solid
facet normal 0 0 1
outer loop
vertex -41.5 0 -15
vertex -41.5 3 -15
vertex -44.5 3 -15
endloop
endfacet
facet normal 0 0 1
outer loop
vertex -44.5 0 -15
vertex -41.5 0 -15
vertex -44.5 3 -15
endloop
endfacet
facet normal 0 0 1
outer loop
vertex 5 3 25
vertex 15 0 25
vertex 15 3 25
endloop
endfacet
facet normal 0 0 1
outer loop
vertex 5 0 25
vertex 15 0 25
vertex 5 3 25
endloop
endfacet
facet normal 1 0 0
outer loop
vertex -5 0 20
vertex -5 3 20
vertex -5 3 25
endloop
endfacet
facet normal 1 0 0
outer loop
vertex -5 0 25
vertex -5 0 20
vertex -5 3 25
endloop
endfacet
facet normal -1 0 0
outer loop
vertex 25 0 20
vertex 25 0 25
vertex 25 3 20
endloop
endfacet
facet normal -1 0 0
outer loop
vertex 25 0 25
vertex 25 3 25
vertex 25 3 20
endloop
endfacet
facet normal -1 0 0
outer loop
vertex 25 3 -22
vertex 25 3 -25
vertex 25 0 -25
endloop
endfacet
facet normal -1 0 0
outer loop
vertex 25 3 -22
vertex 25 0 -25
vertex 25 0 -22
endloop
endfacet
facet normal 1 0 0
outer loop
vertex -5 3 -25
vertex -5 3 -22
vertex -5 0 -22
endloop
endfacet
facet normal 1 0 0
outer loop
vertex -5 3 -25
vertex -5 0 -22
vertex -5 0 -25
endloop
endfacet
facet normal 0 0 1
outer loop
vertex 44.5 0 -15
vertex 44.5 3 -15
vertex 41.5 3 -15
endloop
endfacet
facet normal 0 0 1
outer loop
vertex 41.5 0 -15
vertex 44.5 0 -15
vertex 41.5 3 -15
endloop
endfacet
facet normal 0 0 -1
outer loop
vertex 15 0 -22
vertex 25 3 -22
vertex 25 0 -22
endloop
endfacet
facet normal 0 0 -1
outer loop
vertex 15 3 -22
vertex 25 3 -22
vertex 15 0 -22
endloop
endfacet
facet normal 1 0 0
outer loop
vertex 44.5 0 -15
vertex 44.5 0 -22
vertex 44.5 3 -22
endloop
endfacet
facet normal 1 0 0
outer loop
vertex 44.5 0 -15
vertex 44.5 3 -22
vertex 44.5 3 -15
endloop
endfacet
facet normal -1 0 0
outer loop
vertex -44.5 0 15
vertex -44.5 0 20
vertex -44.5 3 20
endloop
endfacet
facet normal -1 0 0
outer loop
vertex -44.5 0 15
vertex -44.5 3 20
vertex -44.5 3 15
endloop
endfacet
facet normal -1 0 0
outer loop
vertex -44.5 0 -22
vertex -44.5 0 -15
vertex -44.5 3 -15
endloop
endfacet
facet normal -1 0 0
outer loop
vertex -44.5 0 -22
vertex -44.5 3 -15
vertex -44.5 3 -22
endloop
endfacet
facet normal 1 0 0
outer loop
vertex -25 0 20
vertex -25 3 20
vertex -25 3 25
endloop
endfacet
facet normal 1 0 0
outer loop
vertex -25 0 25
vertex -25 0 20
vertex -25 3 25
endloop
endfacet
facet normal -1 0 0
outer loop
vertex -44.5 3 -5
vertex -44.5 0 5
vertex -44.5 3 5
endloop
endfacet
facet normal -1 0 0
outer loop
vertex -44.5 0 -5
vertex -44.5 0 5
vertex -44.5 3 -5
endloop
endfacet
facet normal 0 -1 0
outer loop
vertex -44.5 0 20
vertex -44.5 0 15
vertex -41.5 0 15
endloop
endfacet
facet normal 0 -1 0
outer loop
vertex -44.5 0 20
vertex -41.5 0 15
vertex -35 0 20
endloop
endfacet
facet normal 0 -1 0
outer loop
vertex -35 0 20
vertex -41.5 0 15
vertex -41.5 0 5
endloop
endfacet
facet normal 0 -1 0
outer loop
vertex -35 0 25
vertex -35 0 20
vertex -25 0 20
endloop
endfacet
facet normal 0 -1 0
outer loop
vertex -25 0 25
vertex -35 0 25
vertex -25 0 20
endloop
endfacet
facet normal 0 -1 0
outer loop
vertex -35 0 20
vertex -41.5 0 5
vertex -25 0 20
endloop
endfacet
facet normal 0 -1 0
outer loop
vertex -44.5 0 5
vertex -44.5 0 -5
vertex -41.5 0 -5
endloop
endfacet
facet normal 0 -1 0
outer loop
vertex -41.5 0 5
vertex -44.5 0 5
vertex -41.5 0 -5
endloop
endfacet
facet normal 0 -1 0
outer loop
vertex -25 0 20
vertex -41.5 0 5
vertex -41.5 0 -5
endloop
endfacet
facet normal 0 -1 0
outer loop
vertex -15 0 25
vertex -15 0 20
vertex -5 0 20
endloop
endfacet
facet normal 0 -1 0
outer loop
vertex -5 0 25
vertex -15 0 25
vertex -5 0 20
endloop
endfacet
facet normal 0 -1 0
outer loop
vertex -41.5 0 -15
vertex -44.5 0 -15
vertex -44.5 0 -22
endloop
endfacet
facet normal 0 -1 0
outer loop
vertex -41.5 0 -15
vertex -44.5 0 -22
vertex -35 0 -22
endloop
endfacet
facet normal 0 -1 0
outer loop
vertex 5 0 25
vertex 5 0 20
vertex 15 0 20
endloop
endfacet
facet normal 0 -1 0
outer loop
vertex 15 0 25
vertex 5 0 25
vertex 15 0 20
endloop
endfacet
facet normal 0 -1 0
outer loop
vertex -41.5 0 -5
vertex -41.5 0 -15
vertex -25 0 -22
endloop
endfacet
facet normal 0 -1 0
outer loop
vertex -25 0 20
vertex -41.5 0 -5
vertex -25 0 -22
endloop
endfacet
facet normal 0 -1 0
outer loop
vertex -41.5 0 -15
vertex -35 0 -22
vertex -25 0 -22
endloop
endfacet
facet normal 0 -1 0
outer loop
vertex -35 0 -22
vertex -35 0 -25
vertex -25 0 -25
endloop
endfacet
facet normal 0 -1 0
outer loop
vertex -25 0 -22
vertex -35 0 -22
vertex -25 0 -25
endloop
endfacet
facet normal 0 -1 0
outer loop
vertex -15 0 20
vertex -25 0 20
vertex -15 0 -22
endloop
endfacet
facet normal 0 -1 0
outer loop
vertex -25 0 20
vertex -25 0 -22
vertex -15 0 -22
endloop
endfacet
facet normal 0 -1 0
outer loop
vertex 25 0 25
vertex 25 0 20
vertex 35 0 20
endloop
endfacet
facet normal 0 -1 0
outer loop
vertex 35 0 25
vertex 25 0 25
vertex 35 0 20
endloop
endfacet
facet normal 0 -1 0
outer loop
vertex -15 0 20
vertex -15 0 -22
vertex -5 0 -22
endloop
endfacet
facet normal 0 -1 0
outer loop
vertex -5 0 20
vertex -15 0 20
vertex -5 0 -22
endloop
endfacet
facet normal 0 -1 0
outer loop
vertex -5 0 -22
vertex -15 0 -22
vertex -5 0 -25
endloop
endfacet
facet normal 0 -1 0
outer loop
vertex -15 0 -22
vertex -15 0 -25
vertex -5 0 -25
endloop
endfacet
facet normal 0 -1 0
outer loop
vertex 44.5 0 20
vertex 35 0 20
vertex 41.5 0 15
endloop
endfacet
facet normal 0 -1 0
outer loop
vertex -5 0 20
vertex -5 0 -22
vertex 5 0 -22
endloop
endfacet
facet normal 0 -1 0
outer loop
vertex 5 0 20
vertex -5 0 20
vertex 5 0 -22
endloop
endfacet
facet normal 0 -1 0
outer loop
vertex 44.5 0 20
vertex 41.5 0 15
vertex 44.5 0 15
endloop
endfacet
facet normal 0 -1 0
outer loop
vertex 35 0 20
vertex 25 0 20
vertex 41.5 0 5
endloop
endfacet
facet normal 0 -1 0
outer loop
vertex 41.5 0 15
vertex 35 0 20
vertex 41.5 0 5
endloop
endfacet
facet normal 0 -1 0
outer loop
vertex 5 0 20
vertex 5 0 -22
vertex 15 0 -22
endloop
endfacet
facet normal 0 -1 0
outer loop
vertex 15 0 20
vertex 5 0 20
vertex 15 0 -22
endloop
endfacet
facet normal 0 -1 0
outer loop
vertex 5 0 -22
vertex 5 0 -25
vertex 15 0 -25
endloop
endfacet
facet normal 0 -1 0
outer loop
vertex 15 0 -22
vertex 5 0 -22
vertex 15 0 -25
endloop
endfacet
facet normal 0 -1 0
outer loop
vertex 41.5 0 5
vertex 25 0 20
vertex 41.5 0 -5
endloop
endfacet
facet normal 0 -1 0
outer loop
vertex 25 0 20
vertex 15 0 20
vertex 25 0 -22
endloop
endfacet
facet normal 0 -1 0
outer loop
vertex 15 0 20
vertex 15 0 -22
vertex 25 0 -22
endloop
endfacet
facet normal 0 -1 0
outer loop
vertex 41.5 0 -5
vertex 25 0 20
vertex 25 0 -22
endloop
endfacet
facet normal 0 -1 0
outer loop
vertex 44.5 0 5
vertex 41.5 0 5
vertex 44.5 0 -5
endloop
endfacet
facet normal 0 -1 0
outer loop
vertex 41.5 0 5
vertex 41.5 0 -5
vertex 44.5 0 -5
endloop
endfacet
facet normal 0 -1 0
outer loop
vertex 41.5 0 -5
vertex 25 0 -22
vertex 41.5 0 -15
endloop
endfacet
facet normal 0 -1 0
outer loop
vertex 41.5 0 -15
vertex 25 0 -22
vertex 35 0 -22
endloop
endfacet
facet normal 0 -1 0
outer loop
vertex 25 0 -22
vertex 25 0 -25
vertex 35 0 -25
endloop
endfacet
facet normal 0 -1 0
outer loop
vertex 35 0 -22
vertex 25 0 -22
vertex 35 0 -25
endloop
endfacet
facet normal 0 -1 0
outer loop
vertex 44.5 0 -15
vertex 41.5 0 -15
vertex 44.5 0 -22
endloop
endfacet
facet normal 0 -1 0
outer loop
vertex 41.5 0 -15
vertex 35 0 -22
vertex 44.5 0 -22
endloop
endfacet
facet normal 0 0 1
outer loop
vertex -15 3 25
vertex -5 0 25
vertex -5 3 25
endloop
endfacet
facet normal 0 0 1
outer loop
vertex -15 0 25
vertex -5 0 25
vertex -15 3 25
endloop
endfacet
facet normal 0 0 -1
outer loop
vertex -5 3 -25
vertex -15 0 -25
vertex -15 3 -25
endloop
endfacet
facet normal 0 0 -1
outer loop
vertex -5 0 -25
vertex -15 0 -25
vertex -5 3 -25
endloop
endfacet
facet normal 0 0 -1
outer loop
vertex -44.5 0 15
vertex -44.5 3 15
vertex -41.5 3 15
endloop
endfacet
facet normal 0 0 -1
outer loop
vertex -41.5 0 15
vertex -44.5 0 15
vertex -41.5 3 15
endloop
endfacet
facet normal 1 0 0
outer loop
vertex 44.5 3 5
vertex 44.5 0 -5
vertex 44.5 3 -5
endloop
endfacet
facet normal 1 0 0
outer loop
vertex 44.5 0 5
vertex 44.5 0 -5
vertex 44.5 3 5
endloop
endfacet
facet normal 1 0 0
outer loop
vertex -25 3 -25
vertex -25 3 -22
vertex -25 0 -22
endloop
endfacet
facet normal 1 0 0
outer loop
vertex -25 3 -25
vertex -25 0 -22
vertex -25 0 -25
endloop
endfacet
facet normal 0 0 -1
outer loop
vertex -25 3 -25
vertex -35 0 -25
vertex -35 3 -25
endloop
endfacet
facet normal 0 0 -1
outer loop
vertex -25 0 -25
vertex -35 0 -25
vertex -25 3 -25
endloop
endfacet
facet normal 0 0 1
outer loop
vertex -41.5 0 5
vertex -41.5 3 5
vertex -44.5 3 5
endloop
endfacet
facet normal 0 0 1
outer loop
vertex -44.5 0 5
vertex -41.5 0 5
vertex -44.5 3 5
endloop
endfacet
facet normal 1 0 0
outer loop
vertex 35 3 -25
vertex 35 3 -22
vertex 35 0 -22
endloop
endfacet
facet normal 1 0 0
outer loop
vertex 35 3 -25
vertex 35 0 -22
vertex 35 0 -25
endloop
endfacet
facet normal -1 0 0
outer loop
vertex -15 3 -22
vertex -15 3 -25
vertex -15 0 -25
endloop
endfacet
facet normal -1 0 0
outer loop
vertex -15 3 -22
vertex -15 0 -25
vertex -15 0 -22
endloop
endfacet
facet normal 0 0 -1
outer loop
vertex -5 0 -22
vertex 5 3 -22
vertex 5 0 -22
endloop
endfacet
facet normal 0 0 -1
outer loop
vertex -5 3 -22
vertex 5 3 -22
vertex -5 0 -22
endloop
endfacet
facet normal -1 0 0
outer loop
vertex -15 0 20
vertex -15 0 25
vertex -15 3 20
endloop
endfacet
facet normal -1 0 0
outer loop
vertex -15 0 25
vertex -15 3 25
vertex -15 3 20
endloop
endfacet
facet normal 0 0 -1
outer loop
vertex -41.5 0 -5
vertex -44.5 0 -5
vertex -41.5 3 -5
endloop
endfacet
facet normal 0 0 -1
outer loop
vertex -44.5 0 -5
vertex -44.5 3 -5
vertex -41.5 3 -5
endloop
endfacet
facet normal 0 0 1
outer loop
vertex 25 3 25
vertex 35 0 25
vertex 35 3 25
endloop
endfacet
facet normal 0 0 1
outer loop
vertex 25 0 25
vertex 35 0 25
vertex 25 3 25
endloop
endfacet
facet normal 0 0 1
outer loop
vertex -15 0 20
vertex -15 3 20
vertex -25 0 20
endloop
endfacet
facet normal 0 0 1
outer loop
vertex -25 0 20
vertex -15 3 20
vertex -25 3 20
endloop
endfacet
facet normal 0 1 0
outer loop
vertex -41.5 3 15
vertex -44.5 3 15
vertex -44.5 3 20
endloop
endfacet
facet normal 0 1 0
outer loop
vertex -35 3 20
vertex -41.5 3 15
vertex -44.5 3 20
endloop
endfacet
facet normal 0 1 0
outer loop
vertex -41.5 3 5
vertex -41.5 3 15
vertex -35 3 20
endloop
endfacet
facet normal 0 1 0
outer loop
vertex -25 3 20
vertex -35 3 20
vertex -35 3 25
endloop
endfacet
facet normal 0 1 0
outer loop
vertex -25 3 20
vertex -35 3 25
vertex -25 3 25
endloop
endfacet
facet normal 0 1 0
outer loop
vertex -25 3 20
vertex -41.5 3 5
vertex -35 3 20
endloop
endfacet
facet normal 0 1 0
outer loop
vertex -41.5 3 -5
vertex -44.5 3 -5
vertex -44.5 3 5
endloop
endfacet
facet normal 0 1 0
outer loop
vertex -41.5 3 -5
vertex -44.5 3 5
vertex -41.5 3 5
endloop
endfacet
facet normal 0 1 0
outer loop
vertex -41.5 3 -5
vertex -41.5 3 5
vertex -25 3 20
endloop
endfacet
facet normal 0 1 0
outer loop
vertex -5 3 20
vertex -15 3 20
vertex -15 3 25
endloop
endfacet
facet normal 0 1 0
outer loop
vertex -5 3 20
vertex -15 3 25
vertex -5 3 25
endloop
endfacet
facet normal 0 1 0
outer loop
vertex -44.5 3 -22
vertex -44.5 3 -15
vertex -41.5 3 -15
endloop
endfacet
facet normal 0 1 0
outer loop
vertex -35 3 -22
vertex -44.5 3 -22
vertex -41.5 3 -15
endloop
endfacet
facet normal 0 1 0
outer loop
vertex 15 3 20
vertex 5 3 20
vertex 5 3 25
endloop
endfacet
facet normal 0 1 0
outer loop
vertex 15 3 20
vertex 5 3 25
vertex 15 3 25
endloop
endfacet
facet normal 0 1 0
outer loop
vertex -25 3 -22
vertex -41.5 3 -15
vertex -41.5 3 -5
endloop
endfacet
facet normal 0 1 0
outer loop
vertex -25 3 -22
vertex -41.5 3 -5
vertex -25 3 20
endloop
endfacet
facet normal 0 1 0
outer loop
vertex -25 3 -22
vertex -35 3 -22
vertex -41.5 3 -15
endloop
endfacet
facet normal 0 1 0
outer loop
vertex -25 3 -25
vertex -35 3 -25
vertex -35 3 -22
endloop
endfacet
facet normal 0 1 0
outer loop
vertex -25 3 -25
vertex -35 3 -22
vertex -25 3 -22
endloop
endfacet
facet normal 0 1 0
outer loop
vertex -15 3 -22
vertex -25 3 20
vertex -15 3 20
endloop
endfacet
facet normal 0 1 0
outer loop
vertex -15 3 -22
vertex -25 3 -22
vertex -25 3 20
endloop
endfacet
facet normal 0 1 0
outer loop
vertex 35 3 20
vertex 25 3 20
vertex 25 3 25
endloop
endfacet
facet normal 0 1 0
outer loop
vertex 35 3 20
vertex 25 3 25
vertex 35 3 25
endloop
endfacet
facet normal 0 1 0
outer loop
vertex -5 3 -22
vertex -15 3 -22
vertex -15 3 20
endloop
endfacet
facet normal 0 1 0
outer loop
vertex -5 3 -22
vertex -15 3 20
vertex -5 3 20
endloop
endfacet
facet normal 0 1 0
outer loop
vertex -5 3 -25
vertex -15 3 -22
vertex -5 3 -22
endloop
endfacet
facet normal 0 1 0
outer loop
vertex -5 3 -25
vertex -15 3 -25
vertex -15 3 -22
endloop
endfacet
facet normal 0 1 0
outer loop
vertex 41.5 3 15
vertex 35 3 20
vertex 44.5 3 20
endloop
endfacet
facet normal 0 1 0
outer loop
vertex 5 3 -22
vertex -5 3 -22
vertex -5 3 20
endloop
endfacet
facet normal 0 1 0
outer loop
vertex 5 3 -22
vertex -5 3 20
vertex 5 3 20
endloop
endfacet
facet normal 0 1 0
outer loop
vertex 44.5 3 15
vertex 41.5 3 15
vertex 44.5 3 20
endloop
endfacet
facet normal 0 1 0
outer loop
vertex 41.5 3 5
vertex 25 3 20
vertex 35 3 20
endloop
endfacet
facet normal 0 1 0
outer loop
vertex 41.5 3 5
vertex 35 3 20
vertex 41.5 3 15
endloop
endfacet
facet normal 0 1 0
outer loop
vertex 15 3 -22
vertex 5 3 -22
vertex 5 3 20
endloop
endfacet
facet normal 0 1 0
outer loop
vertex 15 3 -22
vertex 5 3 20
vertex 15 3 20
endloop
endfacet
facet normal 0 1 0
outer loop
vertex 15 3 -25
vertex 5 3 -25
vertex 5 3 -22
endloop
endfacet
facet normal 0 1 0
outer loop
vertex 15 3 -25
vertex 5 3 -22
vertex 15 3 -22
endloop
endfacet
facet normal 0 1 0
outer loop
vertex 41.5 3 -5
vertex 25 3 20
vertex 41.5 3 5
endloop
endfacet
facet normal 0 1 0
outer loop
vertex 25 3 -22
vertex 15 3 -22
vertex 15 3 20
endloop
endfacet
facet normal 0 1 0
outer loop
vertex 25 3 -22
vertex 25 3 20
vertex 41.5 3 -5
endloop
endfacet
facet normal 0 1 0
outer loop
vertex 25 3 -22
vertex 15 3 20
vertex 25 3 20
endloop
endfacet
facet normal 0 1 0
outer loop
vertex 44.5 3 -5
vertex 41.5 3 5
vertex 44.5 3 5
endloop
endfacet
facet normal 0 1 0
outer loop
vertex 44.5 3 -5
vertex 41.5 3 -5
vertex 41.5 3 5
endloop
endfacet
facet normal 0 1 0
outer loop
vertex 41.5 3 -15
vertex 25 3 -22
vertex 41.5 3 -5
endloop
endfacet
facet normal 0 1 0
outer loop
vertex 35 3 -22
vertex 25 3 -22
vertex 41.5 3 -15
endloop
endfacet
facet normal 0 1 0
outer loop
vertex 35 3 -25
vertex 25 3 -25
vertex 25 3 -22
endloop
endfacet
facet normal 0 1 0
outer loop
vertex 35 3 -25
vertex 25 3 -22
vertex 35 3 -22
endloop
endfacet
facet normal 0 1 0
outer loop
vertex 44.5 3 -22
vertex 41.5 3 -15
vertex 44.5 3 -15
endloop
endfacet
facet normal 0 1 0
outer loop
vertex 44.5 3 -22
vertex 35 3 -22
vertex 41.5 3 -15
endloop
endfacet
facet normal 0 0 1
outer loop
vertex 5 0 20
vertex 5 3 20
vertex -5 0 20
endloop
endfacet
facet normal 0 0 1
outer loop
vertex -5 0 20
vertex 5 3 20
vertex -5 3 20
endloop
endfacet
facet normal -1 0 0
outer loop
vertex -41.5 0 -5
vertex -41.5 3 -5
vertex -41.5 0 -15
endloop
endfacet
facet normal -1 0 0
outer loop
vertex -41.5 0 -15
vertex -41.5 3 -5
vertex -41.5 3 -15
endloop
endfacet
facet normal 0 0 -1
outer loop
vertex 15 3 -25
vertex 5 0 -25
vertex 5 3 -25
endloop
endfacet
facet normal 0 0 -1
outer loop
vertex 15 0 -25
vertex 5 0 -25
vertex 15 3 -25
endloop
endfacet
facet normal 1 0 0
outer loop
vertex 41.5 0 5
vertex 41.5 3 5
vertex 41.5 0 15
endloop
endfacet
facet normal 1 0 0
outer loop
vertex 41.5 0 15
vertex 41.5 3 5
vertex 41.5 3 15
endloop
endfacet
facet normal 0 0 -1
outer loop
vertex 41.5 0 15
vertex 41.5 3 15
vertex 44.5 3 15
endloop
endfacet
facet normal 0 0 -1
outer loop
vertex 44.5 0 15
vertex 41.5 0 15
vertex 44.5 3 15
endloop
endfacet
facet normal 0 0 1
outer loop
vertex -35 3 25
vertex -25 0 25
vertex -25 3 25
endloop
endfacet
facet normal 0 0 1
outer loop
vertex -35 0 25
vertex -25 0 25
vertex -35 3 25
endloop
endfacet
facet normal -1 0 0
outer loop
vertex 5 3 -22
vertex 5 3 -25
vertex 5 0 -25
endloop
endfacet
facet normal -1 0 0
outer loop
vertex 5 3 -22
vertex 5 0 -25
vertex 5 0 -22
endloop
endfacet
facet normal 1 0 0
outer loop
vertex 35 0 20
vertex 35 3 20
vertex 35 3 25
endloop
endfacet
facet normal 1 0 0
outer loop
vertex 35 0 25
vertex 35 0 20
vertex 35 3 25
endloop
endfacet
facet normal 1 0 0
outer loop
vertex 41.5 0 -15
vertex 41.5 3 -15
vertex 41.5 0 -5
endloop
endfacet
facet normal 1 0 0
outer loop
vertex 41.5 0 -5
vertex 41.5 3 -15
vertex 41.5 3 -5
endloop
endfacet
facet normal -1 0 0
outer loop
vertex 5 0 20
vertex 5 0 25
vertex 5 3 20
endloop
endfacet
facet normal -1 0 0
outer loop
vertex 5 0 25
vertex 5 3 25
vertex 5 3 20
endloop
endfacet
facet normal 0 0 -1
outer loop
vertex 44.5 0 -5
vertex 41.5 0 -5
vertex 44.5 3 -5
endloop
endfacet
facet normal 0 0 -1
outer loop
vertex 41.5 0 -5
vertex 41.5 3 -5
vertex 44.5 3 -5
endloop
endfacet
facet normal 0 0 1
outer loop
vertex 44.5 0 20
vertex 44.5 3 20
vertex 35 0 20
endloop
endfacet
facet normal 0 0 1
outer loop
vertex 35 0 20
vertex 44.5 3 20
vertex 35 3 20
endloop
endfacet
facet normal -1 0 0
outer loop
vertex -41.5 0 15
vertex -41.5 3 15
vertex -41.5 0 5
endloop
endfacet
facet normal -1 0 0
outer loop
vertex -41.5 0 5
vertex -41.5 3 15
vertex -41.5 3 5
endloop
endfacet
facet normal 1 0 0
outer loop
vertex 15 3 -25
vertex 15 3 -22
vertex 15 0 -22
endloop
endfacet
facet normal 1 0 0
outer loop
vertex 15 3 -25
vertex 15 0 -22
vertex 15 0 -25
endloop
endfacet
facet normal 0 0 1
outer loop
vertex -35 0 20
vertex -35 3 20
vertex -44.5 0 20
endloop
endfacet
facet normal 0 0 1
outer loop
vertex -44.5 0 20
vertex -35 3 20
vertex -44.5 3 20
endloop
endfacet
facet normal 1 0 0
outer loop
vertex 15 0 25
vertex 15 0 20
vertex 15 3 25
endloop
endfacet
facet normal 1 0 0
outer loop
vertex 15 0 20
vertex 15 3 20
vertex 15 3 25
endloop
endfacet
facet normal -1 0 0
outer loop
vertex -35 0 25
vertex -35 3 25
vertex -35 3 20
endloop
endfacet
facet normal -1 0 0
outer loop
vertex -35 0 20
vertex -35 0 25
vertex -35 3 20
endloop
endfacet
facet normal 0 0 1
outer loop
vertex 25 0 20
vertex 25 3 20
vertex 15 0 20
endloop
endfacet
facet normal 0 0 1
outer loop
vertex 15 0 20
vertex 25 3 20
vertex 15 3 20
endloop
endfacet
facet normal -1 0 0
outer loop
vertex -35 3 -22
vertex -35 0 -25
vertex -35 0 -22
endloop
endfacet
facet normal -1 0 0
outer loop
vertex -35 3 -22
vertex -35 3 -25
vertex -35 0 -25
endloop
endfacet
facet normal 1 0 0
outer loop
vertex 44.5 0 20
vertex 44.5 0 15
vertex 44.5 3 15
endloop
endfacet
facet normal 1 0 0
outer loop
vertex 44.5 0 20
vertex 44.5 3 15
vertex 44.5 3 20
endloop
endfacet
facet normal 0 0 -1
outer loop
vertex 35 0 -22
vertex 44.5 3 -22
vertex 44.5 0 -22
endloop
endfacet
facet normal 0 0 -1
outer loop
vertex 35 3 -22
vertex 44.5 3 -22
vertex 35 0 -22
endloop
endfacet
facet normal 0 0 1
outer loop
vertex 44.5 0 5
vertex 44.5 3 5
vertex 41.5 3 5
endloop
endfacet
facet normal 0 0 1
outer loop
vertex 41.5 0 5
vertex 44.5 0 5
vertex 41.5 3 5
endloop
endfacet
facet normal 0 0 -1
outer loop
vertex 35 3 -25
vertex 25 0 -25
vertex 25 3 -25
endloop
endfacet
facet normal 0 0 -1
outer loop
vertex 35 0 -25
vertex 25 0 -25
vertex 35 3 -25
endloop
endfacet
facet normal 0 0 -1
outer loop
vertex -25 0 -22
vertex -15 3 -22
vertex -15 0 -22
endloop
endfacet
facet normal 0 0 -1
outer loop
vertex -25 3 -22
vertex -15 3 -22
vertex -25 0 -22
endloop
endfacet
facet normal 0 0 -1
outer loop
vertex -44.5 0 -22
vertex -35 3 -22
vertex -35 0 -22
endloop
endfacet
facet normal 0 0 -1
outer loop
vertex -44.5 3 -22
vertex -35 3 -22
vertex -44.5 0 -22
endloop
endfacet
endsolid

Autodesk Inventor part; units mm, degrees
ref_plane "YZ Plane" through (0, 0, 0) normal (1, 0, 0) x (0, 1, 0)
ref_plane "XZ Plane" through (0, 0, 0) normal (0, 1, 0) x (-1, 0, 0)
ref_plane "XY Plane" through (0, 0, 0) normal (0, 0, 1) x (1, 0, 0)
sketch "Sketch1" plane through (0, 0, 0) normal (0, 1, 0) x (1, 0, 0)
  line L0 (44.5, -25) -> (-44.5, -25)
  line L1 (-44.5, -25) -> (-44.5, 25)
  line L2 (-44.5, 25) -> (44.5, 25)
  line L3 (44.5, 25) -> (44.5, -25)
  line L4 (44.5, -25) -> (-44.5, 25) construction
  line L5 (-44.5, -25) -> (44.5, 25) construction
  point P0 (0, 0)
  dimension "d0" = 89
  dimension "d1" = 50
extrude "Extrusion1" add sketch "Sketch1" along normal blind 3
sketch "Sketch2" plane through (0, 3, 0) normal (0, 1, 0) x (1, 0, 0)
  line L0 (44.5, 25) -> (-44.5, 25) construction
  line L1 (-5, 25) -> (5, 25)
  line L2 (5, 25) -> (5, 22)
  line L3 (5, 22) -> (-5, 22)
  line L4 (-5, 22) -> (-5, 25)
  line L5 (0, 35) -> (0, -35) construction
  point P0 (0, 0)
  dimension "d4" = 10
  dimension "d5" = 3
extrude "Extrusion2" cut sketch "Sketch2" against normal through all
pattern_linear "Rectangular Pattern1" count 3 spacing 20 along (-1, 0, 0) count 2 spacing 40 along (1, 0, 0) of "Extrusion2"
sketch "Sketch3" plane through (0, 3, 0) normal (0, 1, 0) x (1, 0, 0)
  line L0 (-44.5, -15) -> (-41.5, -15)
  line L1 (-41.5, -15) -> (-41.5, -5)
  line L2 (-41.5, -5) -> (-44.5, -5)
  line L3 (-44.5, -5) -> (-44.5, -15)
  line L4 (-44.5, 25) -> (-44.5, -25) construction
  line L5 (62.3, 0) -> (-62.3, 0) construction
  point P0 (0, 0)
  dimension "d15" = 3
  dimension "d16" = 10
  dimension "d17" = 5
extrude "Extrusion3" cut sketch "Sketch3" against normal blind 3
pattern_linear "Rectangular Pattern2" count 2 spacing 20 along (0, 0, -1) of "Extrusion3"
mirror "Mirror2" about plane through (0, 0, 0) normal (1, 0, 0) of "Extrusion3", "Rectangular Pattern2"
sketch "Sketch4" plane through (0, 3, 0) normal (0, 1, 0) x (1, 0, 0)
  line L0 (-44.5, -25) -> (44.5, -25) construction
  line L1 (-5, -25) -> (5, -25)
  line L2 (5, -25) -> (5, -20)
  line L3 (5, -20) -> (-5, -20)
  line L4 (-5, -20) -> (-5, -25)
  line L5 (0, 35) -> (0, -35) construction
  point P0 (0, 0)
  dimension "d23" = 10
  dimension "d24" = 5
extrude "Extrusion4" cut sketch "Sketch4" against normal through all
pattern_linear "Rectangular Pattern3" count 3 spacing 20 along (-1, 0, 0) count 2 spacing 40 along (1, 0, 0) of "Extrusion4"
equation "\"d0\" = Module_Height"
equation "\"d1\" = Module_Depth"
equation "\"d2\" = Module_Case_Thickness"
equation "\"d4\" = Module_Case_SlotWidth"
equation "\"d5\" = Module_Case_SlotDepth"
equation "\"d7\" = Module_Case_Thickness"
equation "\"d11\" = 2 * Module_Case_SlotWidth"
equation "\"d14\" = 4 * Module_Case_SlotWidth"
equation "\"d15\" = Module_Case_SlotDepth"
equation "\"d16\" = Module_Case_SlotWidth"
equation "\"d17\" = 0.5 * Module_Case_SlotWidth"
equation "\"d18\" = Module_Case_Thickness"
equation "\"d22\" = 2 * Module_Case_SlotWidth"
equation "\"d23\" = Module_Case_SlotWidth"
equation "\"d24\" = Module_Case_BottomSlotDepth"
equation "\"d30\" = 2 * Module_Case_SlotWidth"
equation "\"d33\" = 4 * Module_Case_SlotWidth"
equation "\"RackWidth\" = 482.6"
equation "\"U\" = 44.5"
equation "\"Module_Connector_Width\" = 6"
equation "\"Module_Case_SlotWidth\" = 10"
equation "\"Module_Case_SlotDepth\" = 3"
equation "\"Module_Depth\" = 50"
equation "\"Module_Back_Thickness\" = 5"
equation "\"Module_Connector_Depth\" = 4"
equation "\"Module_Height\" = 89"
equation "\"Module_Width\" = 96.52"
equation "\"Module_Case_Thickness\" = 3"
equation "\"Module_StatusIndicatorDiameter\" = 5"
equation "\"Module_Case_BottomSlotDepth\" = 5"
properties part number "LeftRigthPlate" material "Wood (Birch)"
